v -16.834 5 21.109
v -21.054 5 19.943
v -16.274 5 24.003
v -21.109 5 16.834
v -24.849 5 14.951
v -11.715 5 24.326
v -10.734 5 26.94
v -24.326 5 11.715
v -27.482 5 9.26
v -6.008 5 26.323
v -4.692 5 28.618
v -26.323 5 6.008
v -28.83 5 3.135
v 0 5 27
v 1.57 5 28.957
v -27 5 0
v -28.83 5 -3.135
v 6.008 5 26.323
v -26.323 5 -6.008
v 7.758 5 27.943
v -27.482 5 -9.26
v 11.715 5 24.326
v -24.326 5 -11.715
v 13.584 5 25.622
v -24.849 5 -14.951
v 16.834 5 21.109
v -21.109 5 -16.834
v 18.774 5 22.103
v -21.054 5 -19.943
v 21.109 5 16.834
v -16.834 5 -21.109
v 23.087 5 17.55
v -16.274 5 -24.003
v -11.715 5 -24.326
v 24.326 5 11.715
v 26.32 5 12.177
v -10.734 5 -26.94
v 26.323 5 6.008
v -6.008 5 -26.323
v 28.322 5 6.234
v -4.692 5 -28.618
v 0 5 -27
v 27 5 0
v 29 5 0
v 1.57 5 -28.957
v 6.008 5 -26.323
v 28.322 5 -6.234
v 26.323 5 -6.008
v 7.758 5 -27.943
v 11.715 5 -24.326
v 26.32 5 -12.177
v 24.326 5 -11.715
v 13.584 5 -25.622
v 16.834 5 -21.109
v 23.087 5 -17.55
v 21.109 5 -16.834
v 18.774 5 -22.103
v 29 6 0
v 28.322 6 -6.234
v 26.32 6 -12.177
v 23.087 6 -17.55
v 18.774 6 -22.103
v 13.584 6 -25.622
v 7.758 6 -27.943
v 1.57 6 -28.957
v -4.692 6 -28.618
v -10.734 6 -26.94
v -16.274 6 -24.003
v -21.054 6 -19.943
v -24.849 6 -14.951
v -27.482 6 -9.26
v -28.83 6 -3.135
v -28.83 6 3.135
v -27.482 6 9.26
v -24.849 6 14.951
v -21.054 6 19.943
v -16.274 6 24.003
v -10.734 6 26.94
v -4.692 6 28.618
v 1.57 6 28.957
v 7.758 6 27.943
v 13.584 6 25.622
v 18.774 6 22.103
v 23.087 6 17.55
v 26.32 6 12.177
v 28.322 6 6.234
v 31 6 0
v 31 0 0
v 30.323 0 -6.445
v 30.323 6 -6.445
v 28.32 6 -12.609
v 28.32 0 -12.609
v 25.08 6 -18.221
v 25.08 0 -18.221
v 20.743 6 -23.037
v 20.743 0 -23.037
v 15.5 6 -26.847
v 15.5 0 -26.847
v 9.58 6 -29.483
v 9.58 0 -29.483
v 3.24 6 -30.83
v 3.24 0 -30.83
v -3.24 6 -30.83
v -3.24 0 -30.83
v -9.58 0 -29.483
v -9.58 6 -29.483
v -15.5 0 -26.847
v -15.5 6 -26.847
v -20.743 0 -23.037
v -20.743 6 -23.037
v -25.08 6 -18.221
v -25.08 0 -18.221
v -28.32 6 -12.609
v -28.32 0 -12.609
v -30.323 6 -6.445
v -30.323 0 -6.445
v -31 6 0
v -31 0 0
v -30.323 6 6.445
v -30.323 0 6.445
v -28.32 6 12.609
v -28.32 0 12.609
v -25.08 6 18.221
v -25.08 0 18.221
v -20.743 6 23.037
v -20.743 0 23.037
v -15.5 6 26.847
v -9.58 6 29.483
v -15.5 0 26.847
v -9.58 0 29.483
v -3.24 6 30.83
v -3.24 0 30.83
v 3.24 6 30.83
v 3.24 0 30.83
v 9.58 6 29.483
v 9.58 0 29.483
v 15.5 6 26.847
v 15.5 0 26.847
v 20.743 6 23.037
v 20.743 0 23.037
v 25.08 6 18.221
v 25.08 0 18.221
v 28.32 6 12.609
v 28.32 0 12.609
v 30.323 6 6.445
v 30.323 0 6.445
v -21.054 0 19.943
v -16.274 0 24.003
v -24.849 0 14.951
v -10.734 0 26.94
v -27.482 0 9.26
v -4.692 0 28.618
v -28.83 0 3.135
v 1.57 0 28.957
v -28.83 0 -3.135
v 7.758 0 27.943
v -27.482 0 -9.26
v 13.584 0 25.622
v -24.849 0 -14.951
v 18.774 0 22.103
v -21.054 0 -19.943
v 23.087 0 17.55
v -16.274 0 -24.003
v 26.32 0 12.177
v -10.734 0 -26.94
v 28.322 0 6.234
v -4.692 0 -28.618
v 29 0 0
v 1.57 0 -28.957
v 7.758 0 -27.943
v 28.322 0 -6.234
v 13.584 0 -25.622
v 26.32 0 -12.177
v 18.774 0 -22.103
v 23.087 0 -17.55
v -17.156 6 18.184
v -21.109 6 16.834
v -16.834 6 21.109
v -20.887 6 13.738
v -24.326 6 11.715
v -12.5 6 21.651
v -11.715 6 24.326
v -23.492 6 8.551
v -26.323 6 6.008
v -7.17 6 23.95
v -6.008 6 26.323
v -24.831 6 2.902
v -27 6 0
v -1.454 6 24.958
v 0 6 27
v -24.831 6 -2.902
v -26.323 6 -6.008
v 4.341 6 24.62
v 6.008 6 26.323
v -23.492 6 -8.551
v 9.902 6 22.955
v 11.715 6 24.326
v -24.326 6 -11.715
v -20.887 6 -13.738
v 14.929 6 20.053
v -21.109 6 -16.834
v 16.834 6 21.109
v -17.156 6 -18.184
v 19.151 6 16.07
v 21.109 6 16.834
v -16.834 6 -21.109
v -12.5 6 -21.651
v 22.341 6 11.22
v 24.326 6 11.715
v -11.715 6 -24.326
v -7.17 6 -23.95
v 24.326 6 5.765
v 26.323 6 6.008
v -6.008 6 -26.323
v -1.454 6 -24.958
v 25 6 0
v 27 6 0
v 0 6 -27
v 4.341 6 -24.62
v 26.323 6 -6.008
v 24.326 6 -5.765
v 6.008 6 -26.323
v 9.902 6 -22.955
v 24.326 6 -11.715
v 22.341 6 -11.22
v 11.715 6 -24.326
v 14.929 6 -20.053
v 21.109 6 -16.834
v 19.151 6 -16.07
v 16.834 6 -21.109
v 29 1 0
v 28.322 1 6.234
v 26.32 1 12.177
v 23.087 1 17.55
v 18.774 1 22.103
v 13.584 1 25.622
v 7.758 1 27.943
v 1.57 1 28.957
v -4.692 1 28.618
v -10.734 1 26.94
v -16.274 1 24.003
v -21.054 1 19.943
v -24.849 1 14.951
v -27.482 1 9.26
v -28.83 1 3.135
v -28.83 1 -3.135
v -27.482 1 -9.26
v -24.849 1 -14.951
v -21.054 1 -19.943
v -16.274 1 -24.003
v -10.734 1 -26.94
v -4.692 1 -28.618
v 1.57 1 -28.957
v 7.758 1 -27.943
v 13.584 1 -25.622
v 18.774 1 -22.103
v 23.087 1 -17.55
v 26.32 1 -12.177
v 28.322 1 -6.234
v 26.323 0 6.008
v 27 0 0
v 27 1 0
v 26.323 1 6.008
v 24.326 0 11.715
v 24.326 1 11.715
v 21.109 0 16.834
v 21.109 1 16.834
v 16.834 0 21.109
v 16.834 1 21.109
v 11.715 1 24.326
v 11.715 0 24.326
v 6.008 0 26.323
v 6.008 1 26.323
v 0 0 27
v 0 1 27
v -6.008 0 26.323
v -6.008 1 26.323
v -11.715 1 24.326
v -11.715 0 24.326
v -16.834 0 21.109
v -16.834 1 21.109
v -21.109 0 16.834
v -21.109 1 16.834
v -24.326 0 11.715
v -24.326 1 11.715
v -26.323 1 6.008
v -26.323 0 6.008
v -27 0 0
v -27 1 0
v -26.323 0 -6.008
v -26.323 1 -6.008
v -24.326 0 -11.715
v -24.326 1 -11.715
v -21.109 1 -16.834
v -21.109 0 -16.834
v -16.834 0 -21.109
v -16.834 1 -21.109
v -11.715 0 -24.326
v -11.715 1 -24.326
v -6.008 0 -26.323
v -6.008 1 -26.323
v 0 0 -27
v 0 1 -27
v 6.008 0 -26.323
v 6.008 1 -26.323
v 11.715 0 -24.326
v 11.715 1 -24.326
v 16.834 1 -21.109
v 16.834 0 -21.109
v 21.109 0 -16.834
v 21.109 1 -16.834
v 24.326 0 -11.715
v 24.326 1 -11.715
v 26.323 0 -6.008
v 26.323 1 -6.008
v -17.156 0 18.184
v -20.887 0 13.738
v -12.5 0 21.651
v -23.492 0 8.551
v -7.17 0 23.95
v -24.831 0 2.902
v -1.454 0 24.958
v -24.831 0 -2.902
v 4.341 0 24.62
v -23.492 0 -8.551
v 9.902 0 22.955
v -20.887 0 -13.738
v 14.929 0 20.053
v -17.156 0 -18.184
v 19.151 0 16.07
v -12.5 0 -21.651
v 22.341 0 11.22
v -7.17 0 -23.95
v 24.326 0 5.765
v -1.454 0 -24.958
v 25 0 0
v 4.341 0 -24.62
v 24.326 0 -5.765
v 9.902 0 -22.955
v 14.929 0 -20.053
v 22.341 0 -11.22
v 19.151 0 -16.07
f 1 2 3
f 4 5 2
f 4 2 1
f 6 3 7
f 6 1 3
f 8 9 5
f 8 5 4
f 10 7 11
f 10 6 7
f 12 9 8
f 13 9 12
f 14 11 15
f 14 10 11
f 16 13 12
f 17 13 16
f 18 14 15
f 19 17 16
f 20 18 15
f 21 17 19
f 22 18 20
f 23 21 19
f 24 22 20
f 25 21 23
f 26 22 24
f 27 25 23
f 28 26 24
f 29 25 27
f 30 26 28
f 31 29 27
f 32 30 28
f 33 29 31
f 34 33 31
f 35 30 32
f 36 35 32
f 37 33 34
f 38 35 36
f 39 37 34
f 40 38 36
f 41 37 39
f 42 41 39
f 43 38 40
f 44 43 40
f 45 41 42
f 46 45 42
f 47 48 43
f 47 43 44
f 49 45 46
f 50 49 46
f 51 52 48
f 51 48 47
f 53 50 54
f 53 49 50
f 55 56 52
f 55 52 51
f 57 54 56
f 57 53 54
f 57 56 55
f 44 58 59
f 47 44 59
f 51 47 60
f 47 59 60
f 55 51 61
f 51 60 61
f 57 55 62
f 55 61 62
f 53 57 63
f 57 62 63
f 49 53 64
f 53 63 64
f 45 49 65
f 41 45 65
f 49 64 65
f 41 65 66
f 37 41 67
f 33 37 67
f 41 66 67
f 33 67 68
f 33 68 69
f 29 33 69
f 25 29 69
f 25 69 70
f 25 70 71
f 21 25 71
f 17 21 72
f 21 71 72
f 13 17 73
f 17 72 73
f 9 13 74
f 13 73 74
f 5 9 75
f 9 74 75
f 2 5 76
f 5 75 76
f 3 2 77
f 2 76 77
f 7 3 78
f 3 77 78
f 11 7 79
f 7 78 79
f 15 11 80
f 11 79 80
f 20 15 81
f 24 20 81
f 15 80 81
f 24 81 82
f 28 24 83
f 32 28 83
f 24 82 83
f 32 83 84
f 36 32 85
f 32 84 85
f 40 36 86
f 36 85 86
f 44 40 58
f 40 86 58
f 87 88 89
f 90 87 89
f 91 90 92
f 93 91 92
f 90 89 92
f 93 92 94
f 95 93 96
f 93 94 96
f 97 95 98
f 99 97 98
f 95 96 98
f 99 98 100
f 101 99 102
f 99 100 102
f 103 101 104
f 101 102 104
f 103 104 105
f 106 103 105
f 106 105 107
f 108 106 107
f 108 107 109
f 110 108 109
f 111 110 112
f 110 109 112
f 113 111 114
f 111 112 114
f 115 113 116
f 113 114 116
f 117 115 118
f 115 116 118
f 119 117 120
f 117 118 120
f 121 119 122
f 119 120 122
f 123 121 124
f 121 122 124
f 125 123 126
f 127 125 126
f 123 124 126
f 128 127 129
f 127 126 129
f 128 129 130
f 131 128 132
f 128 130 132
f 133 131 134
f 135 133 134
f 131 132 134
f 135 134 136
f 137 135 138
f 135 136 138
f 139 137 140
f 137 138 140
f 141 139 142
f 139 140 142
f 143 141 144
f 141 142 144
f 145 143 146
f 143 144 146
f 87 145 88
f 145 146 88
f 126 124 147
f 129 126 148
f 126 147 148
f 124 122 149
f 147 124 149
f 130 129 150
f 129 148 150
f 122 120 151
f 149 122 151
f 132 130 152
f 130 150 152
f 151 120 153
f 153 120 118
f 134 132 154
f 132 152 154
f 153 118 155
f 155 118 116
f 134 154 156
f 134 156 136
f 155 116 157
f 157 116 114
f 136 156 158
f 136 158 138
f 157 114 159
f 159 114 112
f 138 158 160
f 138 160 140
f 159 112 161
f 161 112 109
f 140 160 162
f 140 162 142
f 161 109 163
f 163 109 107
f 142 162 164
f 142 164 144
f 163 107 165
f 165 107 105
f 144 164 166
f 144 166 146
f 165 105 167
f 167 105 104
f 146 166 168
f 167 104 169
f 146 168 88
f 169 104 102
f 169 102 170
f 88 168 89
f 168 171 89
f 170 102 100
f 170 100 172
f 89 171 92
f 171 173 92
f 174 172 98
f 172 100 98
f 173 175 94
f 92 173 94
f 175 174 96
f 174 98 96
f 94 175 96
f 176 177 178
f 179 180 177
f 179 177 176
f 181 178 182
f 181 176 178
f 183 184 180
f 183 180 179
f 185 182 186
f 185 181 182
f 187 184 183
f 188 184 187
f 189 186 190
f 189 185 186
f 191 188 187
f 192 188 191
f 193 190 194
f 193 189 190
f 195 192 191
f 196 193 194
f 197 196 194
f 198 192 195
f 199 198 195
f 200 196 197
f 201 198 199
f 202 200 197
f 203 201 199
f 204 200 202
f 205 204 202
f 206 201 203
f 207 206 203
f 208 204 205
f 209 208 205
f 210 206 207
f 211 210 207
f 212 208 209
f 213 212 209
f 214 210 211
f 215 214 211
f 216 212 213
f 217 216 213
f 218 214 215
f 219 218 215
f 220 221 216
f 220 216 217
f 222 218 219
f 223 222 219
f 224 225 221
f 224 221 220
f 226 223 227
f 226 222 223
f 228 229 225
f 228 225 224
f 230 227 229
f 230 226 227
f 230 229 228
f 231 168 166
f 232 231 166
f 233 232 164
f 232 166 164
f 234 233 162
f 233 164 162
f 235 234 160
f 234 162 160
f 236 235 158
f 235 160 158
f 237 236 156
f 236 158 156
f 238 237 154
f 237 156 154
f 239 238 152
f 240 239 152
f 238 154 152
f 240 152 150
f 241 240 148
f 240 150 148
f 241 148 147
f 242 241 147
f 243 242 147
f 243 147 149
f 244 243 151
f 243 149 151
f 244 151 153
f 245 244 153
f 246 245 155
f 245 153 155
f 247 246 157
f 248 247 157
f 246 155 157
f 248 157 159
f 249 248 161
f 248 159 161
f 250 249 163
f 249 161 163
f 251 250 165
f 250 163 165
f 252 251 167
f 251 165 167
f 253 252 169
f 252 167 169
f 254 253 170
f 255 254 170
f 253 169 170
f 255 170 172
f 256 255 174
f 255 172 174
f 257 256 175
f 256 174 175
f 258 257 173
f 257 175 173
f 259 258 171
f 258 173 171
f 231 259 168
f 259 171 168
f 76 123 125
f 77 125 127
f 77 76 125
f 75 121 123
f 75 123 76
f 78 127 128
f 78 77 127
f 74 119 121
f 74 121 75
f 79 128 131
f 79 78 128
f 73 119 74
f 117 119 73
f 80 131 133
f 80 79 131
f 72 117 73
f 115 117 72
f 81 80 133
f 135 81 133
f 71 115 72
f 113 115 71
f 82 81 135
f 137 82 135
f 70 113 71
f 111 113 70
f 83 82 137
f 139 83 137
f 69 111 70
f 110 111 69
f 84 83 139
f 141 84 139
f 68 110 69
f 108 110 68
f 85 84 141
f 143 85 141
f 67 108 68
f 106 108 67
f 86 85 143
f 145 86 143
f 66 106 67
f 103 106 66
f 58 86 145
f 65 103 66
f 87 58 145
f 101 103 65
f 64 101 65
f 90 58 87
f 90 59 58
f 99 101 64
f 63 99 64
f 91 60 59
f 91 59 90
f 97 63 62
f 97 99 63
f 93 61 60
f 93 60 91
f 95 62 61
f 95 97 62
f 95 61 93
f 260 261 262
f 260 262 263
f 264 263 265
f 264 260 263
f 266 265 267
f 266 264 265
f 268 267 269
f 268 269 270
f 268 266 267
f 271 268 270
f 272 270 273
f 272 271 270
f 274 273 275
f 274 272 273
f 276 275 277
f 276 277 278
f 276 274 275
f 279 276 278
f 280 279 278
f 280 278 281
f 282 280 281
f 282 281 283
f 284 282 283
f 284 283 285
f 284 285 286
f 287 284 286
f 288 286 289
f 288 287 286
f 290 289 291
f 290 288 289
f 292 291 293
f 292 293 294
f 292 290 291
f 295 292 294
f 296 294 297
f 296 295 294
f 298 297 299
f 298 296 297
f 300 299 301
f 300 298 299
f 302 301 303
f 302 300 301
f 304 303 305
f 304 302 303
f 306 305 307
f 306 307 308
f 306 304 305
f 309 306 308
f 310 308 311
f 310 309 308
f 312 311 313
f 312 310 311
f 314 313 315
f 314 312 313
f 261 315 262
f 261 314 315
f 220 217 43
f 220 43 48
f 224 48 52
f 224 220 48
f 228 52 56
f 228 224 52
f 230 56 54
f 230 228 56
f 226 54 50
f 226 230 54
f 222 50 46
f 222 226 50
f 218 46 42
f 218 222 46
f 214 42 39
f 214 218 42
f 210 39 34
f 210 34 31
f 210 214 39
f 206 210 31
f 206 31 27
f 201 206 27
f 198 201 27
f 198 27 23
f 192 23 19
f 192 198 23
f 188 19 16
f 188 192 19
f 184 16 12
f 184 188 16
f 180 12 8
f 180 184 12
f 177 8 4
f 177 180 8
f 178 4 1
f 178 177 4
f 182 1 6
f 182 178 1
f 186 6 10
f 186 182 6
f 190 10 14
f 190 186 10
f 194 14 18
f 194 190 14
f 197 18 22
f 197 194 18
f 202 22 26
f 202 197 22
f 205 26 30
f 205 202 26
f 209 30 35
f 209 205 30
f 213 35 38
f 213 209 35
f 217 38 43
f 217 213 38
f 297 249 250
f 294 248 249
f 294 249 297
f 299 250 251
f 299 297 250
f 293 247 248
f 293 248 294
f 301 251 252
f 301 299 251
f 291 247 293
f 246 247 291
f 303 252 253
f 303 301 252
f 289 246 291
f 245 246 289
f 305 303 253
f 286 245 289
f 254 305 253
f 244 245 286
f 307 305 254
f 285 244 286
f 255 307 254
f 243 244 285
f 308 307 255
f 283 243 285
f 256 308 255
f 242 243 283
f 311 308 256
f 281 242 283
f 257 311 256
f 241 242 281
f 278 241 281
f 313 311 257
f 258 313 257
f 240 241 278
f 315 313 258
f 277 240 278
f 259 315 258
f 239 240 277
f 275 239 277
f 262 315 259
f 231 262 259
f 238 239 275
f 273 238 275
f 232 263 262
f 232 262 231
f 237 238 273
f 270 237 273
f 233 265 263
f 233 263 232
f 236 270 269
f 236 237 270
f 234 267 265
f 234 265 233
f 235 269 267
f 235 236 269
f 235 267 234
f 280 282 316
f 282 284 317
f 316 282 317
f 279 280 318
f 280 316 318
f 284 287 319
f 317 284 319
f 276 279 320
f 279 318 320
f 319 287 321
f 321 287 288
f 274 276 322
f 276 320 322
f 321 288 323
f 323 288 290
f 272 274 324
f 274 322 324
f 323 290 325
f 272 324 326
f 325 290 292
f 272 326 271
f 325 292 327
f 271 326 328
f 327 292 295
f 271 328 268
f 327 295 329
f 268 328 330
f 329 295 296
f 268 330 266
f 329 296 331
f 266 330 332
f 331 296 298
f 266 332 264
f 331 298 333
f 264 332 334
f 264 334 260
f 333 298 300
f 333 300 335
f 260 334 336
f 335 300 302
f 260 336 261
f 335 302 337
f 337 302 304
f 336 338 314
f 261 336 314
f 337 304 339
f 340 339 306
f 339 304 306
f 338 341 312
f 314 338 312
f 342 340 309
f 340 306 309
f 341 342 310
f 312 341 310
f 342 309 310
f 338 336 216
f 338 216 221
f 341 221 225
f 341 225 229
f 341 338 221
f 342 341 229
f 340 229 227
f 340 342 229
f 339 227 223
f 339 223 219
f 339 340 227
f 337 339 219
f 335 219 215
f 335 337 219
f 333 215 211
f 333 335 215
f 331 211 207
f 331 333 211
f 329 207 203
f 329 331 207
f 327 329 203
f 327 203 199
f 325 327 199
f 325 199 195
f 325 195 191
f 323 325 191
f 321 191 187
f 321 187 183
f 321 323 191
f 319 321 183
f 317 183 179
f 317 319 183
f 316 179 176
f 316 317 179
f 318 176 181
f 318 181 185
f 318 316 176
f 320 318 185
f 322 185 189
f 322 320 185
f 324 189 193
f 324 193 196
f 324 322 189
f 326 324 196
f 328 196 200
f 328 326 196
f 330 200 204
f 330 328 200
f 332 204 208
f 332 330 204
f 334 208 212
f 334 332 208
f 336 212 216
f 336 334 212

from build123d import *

# Parameters (mm, degrees)
SKETCH1_R           = 31
SKETCH1_R_2         = 25
BOSS_EXTRUDE1_DEPTH = 6
SKETCH2_R           = 29
SKETCH2_R_2         = 27
CUT_EXTRUDE1_DEPTH  = 1
SKETCH3_R           = 29
SKETCH3_R_2         = 27
CUT_EXTRUDE2_DEPTH  = 1


with BuildPart() as part:
    # Sketch1 → Boss-Extrude1 (new body)
    with BuildSketch(Plane(origin=(0, 0, 0), x_dir=(1, 0, 0), z_dir=(0, 1, 0))):
        Circle(SKETCH1_R)
        Circle(SKETCH1_R_2, mode=Mode.SUBTRACT)
    extrude(amount=BOSS_EXTRUDE1_DEPTH)

    # Sketch2 → Cut-Extrude1 (cut)
    with BuildSketch(Plane(origin=(0, 6, 0), x_dir=(1, 0, 0), z_dir=(0, 1, 0))):
        Circle(SKETCH2_R)
        Circle(SKETCH2_R_2, mode=Mode.SUBTRACT)
    extrude(amount=-CUT_EXTRUDE1_DEPTH, mode=Mode.SUBTRACT)

    # Sketch3 → Cut-Extrude2 (cut)
    with BuildSketch(Plane.XZ):
        Circle(SKETCH3_R)
        Circle(SKETCH3_R_2, mode=Mode.SUBTRACT)
    extrude(amount=-CUT_EXTRUDE2_DEPTH, mode=Mode.SUBTRACT)


solid = part.part
